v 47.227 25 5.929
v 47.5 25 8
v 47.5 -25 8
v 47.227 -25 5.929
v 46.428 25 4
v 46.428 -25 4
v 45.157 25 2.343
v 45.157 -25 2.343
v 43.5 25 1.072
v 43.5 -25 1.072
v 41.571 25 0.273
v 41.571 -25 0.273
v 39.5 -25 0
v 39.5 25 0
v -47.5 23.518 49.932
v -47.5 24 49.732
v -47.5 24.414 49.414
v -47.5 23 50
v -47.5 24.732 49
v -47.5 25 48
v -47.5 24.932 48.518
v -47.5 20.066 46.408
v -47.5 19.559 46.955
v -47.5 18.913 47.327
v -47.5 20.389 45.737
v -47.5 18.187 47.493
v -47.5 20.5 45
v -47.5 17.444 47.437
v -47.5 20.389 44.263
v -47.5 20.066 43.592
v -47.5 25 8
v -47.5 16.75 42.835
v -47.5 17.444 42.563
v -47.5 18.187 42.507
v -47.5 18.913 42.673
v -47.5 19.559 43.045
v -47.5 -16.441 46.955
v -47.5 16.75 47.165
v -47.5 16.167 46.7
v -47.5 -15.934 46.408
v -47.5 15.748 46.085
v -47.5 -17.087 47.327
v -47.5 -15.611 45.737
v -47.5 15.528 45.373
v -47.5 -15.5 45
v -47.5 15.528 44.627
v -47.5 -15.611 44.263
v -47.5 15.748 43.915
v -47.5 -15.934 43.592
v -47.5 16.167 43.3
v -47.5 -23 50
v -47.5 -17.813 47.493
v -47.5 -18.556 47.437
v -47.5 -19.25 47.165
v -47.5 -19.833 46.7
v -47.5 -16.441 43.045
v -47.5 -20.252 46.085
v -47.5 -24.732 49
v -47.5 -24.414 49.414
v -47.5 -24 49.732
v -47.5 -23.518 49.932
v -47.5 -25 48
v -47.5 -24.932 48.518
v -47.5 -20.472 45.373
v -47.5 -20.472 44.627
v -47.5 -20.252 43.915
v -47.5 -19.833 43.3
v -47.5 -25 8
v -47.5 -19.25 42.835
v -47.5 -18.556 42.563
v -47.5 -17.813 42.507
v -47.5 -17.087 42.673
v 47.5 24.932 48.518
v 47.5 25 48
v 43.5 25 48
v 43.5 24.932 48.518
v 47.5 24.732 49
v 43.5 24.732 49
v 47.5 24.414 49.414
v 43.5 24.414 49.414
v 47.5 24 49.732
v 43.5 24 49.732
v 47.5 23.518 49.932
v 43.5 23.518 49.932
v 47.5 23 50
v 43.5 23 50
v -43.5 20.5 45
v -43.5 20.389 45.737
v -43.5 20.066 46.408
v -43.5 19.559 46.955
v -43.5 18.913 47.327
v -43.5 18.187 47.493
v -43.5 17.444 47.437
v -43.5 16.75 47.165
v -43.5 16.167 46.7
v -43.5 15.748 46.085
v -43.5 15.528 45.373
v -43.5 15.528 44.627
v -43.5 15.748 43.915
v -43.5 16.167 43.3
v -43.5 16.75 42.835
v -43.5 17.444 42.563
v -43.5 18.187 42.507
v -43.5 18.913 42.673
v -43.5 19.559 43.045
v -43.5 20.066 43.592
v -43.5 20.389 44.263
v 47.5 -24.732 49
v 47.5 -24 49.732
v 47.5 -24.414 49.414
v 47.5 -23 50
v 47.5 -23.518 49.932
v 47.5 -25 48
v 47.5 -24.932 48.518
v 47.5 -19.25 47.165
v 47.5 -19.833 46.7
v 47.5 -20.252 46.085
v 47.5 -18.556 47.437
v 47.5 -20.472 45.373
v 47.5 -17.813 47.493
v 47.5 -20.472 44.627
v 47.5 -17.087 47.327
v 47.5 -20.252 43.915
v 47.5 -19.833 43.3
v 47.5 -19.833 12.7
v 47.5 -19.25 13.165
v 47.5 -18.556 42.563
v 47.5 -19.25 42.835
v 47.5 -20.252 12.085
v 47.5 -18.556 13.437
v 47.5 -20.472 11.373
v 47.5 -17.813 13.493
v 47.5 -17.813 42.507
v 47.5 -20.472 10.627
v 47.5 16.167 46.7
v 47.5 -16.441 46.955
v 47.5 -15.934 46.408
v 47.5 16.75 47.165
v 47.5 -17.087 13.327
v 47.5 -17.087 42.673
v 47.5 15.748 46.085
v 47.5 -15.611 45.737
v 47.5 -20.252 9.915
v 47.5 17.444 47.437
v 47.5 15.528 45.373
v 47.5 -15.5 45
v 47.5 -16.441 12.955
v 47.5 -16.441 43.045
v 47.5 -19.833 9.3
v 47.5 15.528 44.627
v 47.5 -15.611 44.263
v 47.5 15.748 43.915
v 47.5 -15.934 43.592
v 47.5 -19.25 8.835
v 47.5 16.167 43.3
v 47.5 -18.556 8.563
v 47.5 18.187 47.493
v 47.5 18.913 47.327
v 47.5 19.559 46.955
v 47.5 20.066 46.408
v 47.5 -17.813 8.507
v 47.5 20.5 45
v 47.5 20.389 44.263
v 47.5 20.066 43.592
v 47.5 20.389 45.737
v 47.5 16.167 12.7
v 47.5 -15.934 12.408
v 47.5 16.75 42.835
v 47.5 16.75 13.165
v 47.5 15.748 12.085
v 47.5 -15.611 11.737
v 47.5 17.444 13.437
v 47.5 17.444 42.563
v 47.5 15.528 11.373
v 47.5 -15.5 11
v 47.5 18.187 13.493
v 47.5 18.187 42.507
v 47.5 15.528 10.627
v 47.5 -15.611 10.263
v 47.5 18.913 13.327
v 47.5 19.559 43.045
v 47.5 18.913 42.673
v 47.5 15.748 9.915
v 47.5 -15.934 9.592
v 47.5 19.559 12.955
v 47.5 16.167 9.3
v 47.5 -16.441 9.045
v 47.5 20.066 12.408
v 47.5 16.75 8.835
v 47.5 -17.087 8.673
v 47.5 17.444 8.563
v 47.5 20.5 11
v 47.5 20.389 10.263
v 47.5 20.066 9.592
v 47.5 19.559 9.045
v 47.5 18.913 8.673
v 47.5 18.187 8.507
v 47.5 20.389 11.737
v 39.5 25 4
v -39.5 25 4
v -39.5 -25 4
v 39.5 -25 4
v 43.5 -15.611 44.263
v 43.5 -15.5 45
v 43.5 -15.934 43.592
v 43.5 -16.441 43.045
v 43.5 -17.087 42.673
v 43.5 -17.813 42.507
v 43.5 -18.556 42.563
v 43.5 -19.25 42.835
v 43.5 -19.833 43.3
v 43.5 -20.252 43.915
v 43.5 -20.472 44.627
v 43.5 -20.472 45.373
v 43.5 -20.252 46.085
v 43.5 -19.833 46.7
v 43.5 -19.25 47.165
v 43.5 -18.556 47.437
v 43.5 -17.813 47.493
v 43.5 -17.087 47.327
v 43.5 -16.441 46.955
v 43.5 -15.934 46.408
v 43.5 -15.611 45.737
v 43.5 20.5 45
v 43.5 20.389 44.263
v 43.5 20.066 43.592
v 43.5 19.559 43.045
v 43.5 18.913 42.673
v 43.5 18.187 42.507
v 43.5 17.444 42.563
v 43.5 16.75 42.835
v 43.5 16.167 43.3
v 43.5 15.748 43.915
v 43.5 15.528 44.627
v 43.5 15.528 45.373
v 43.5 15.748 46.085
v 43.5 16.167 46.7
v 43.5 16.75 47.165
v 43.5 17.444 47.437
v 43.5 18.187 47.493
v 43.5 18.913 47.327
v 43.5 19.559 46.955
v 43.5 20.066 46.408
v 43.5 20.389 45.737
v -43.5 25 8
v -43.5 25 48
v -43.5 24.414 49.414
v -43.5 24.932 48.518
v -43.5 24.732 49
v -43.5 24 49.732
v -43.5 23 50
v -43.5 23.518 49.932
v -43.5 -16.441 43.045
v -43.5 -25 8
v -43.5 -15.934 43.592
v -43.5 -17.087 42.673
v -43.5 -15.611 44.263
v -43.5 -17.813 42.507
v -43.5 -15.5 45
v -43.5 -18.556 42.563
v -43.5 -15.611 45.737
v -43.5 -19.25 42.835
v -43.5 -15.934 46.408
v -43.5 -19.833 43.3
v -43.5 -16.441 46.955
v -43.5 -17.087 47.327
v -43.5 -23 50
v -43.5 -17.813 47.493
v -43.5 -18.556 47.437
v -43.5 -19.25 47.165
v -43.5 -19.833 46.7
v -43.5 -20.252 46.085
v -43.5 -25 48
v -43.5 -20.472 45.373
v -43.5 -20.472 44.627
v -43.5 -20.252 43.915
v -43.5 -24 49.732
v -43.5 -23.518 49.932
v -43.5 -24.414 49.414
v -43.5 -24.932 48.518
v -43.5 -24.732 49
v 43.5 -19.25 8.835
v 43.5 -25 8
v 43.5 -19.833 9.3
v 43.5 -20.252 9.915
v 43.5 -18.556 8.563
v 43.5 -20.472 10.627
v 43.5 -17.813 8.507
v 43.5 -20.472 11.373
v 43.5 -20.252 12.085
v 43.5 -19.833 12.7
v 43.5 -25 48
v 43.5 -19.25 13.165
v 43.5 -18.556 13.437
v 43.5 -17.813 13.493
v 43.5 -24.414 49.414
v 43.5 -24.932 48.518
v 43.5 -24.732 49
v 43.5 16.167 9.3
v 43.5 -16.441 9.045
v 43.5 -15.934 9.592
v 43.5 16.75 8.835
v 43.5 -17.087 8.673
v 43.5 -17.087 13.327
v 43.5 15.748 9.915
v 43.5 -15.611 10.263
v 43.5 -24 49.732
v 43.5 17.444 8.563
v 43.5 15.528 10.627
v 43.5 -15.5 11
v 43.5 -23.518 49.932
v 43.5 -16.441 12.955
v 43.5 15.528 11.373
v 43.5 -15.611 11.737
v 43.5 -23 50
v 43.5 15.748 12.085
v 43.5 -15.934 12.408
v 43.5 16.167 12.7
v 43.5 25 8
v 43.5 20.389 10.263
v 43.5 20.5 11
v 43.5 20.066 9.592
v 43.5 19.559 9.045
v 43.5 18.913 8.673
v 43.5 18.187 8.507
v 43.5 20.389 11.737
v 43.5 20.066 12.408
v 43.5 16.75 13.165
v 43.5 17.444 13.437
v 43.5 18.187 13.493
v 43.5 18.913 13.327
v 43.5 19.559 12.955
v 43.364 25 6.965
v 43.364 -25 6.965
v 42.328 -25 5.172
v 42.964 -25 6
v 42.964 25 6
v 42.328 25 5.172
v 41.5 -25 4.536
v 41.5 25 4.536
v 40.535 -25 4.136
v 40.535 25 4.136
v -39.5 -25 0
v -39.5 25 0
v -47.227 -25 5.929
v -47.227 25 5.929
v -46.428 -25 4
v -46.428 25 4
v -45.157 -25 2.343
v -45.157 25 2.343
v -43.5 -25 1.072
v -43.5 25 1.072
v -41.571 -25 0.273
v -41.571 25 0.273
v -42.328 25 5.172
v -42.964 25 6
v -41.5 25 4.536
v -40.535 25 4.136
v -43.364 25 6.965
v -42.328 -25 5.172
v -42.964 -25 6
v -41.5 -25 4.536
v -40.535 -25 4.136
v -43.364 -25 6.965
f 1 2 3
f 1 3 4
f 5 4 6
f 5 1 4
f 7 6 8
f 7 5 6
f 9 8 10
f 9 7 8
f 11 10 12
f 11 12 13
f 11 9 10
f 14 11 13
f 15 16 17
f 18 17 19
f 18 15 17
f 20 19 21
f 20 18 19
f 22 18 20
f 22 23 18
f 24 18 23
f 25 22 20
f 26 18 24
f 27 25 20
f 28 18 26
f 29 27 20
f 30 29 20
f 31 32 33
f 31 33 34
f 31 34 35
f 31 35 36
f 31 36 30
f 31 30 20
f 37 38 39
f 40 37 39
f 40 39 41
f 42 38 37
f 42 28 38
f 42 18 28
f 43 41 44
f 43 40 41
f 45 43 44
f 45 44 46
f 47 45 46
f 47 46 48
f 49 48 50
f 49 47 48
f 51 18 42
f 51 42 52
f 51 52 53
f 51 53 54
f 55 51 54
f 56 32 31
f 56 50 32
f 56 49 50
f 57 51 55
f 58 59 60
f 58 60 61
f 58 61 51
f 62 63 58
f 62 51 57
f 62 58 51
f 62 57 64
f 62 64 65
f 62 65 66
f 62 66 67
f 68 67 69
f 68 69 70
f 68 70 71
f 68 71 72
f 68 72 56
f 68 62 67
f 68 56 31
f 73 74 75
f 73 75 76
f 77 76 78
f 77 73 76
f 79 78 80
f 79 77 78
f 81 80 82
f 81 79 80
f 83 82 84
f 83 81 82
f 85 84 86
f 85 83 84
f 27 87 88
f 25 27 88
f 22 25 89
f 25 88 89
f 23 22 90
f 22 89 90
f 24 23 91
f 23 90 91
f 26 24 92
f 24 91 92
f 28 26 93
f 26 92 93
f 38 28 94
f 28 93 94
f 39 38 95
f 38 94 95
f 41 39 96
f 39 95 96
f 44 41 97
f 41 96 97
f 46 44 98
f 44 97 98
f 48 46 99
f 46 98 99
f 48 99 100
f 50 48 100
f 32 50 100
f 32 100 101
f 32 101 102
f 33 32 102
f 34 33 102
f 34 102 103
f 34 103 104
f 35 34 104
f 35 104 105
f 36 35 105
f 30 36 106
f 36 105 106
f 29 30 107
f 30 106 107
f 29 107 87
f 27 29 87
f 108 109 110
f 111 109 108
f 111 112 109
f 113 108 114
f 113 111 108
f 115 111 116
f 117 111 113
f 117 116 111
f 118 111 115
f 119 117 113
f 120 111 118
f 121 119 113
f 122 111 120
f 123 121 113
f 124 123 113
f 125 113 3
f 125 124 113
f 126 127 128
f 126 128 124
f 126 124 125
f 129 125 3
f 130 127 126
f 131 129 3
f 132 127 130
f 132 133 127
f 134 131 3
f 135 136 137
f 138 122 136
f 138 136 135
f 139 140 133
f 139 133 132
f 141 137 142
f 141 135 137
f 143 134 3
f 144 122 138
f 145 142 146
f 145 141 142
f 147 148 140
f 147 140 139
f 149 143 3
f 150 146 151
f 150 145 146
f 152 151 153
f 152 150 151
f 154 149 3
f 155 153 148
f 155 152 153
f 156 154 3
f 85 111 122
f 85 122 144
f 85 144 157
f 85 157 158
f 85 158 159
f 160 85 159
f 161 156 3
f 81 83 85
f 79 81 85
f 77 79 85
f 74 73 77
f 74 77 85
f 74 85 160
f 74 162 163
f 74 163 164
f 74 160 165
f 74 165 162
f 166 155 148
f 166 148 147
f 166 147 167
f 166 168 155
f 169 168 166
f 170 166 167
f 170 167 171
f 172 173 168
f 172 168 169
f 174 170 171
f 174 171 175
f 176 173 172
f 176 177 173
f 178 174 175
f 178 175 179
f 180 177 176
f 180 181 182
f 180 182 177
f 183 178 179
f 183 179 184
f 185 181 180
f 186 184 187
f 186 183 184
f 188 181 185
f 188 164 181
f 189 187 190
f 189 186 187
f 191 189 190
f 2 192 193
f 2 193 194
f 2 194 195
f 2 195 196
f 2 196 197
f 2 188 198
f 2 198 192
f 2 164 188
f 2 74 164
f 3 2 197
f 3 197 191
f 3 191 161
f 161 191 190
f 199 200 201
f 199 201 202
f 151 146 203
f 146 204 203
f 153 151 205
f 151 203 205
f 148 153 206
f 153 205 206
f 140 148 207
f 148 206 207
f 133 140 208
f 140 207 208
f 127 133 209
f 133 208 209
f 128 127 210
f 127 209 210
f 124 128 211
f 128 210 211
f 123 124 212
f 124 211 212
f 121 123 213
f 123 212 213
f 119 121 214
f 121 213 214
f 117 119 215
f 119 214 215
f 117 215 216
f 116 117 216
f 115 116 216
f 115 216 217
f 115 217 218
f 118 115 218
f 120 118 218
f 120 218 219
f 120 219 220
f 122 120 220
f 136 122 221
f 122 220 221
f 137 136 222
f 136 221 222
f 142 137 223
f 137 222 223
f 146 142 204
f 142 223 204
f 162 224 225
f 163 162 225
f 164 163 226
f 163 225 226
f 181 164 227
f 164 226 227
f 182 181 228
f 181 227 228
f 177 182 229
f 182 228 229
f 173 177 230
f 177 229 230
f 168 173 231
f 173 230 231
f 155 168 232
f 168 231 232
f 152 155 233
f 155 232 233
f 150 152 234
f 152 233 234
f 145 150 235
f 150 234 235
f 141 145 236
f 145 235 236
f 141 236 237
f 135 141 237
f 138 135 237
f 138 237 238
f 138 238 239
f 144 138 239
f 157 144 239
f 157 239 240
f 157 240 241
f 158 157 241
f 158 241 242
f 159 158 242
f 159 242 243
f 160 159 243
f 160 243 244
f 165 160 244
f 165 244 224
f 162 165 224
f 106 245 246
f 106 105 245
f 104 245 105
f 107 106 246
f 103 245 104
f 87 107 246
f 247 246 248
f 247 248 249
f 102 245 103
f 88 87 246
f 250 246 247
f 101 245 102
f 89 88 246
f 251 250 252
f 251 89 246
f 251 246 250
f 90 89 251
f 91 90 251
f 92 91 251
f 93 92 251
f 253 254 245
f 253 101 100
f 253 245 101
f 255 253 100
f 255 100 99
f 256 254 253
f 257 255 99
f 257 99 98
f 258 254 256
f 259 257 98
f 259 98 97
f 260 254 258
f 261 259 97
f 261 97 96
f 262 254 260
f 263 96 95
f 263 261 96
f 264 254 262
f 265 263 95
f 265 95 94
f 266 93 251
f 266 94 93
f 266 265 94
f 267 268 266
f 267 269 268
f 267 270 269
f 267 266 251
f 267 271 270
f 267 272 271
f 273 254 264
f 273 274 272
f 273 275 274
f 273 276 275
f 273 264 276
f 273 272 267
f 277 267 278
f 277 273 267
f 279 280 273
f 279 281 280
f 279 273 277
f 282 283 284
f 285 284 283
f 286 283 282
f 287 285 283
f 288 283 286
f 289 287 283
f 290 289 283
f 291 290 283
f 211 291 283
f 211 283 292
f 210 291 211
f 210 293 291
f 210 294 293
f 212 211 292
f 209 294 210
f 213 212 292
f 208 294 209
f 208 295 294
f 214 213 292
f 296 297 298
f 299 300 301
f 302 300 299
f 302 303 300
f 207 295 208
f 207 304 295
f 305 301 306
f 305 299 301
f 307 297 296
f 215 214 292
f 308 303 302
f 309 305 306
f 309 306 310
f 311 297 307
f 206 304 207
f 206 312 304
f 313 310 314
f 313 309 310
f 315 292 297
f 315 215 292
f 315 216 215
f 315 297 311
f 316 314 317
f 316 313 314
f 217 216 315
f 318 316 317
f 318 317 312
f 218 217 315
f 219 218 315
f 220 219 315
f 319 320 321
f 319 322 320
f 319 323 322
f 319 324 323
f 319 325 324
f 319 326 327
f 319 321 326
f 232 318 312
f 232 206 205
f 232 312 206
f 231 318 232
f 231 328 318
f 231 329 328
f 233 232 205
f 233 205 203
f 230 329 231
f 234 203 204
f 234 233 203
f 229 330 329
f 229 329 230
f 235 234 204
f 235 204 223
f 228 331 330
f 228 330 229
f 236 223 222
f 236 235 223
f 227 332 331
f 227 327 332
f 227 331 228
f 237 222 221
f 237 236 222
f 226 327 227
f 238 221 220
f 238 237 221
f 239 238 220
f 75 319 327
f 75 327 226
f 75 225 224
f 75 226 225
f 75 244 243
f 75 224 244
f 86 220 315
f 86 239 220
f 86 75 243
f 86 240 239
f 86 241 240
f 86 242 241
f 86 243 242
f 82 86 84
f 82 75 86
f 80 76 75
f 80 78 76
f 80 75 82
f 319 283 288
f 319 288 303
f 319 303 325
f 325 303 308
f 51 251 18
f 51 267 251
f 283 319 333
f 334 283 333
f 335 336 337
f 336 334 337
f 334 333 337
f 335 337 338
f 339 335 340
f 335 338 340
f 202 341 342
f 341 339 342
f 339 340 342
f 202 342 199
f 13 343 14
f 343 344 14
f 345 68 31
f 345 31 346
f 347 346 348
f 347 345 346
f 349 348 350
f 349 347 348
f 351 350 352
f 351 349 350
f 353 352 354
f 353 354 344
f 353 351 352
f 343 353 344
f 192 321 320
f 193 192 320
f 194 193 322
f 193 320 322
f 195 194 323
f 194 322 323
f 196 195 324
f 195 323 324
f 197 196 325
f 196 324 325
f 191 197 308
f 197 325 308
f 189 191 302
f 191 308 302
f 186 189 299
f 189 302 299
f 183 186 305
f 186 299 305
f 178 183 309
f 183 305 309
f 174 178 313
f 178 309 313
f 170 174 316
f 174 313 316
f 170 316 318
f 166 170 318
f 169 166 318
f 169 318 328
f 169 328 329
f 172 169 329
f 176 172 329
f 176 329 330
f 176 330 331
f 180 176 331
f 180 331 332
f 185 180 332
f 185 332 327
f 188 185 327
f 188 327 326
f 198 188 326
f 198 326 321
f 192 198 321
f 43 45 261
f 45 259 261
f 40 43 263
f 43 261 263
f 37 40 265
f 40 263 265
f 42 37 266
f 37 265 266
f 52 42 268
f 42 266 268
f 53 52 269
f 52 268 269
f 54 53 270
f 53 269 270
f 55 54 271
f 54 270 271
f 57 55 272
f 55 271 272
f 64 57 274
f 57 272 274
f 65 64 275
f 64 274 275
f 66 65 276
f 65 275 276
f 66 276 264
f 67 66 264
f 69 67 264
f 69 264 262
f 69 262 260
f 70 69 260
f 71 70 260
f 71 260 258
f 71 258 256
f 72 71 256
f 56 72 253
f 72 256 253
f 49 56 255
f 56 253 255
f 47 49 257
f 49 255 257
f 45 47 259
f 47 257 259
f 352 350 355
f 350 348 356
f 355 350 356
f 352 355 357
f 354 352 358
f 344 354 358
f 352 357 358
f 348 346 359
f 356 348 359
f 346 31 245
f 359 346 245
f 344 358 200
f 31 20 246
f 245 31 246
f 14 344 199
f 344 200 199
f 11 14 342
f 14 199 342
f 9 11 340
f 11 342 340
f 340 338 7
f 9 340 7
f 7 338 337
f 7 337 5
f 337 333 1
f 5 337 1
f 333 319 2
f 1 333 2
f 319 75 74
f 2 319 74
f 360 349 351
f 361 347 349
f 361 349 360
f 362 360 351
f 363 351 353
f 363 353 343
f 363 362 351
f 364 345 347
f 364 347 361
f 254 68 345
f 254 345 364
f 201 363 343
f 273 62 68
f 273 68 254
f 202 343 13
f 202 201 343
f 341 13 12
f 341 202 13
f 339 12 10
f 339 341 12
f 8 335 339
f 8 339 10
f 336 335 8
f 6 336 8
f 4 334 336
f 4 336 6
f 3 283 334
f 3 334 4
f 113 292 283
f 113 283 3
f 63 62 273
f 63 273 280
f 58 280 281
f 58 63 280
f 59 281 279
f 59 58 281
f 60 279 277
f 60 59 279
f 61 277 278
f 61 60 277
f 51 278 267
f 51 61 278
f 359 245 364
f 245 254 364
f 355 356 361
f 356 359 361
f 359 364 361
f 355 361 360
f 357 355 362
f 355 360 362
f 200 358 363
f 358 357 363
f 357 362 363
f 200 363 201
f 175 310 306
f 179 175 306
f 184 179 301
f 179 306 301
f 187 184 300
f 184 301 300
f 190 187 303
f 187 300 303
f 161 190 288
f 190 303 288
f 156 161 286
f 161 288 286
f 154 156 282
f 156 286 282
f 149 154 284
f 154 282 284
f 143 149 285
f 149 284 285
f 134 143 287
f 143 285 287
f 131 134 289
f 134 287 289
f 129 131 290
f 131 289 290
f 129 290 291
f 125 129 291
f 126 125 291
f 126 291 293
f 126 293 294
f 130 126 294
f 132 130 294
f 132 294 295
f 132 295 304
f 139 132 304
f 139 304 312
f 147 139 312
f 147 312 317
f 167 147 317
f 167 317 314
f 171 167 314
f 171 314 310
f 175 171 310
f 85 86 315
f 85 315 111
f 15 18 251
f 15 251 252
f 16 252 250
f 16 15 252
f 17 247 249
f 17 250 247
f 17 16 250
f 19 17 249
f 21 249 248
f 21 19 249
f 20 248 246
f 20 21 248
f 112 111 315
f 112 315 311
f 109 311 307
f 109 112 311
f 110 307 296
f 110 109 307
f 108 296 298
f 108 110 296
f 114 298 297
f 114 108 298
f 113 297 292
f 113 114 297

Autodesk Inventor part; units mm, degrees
ref_plane "YZ Plane" through (0, 0, 0) normal (1, 0, 0) x (0, 1, 0)
ref_plane "XZ Plane" through (0, 0, 0) normal (0, 1, 0) x (-1, 0, 0)
ref_plane "XY Plane" through (0, 0, 0) normal (0, 0, 1) x (1, 0, 0)
sketch "Sketch1" plane through (0, 0, 0) normal (0, 0, 1) x (1, 0, 0)
  line L0 (-47.5, 25) -> (47.5, 25)
  line L1 (47.5, 25) -> (47.5, -25)
  line L2 (47.5, -25) -> (-47.5, -25)
  line L3 (-47.5, -25) -> (-47.5, 25)
  line L4 (-47.5, 25) -> (47.5, -25) construction
  line L5 (47.5, 25) -> (-47.5, -25) construction
  point P0 (0, 0)
  dimension "d0" = 50
  dimension "d20" = 95
extrude "Plate1" add sketch "Sketch1" along normal blind 4
sketch "Sketch2" plane through (-43.5, -25, 0) normal (-1, 0, 0) x (0, -1, 0)
  line L0 (-50, 0) -> (0, 0)
  line L1 (0, 0) -> (0, 50)
  line L2 (0, 50) -> (-50, 50)
  line L3 (-50, 50) -> (-50, 0)
edge flange "Flange1" height 50 angle 90 thickness 4 bend radius 4 thickness toward (-1, 0, 0) relief tear relief width 4 relief depth 2 corner gap 4 corner form 0 edges at (-47.5, 0, 4) (47.5, 0, 4) wall of the first edge with corners at (-43.5, 25, 0) (-43.5, -25, 0) (-43.5, -25, 50) (-43.5, 25, 50)
bend "Bend1"
corner "Corner1"
sketch "Sketch3" plane through (0, 0, 0) normal (1, 0, 0) x (0, 1, 0)
  line L0 (25, 8) -> (25, 50) projected
  line L1 (25, 50) -> (-25, 50) projected
  line L2 (-25, 50) -> (-25, 8) projected
  line L3 (-18, 11) -> (18, 11) construction
  line L4 (18, 11) -> (18, 45) construction
  line L5 (18, 45) -> (-18, 45) construction
  line L6 (-18, 45) -> (-18, 11) construction
  line L7 (-18, 11) -> (18, 45) construction
  line L8 (18, 11) -> (-18, 45) construction
  circle A0 centre (18, 45) radius 2.5
  circle A1 centre (-18, 45) radius 2.5
  circle A2 centre (-18, 11) radius 2.5
  circle A3 centre (18, 11) radius 2.5
  point P0 (0, 0)
  point P1 (0, 28)
  dimension "d12" = 5
  dimension "d13" = 7
  dimension "d14" = 7
  dimension "d15" = 34
  dimension "d16" = 5
extrude "Extrusion1" cut sketch "Sketch3" along normal through all both and the other way through all contours A0 | A1
fillet "Fillet1" radius 2 4 edges at (-45.5, 25, 50) (-45.5, -25, 50) (45.5, 25, 50) (45.5, -25, 50)
extrude "Extrusion2" cut sketch "Sketch3" along normal through all contours A2 | A3
equation "\"d14\" = d13"
equation "\"d2\" = BendReliefWidth"
equation "\"d3\" = BendReliefDepth"
equation "\"d4\" = MinimumRemnant"
equation "\"d5\" = BendRadius"
equation "\"d8\" = BendRadius"
equation "\"d9\" = CornerReliefSize"
equation "\"d10\" = GapSize"
equation "\"d11\" = JacobiRadiusSize"
equation "\"BendRadius\" = Thickness"
equation "\"BendReliefWidth\" = Thickness"
equation "\"BendReliefDepth\" = 0.5 * Thickness"
equation "\"CornerReliefSize\" = 4 * Thickness"
equation "\"MinimumRemnant\" = 2 * Thickness"
equation "\"TransitionRadius\" = BendRadius"
equation "\"JacobiRadiusSize\" = BendRadius"
equation "\"GapSize\" = Thickness"
equation "\"d1\" = BendRadius"
equation "\"Thickness\" = 4"
properties part number "coluna-apoio" material "Aluminum 6061"
